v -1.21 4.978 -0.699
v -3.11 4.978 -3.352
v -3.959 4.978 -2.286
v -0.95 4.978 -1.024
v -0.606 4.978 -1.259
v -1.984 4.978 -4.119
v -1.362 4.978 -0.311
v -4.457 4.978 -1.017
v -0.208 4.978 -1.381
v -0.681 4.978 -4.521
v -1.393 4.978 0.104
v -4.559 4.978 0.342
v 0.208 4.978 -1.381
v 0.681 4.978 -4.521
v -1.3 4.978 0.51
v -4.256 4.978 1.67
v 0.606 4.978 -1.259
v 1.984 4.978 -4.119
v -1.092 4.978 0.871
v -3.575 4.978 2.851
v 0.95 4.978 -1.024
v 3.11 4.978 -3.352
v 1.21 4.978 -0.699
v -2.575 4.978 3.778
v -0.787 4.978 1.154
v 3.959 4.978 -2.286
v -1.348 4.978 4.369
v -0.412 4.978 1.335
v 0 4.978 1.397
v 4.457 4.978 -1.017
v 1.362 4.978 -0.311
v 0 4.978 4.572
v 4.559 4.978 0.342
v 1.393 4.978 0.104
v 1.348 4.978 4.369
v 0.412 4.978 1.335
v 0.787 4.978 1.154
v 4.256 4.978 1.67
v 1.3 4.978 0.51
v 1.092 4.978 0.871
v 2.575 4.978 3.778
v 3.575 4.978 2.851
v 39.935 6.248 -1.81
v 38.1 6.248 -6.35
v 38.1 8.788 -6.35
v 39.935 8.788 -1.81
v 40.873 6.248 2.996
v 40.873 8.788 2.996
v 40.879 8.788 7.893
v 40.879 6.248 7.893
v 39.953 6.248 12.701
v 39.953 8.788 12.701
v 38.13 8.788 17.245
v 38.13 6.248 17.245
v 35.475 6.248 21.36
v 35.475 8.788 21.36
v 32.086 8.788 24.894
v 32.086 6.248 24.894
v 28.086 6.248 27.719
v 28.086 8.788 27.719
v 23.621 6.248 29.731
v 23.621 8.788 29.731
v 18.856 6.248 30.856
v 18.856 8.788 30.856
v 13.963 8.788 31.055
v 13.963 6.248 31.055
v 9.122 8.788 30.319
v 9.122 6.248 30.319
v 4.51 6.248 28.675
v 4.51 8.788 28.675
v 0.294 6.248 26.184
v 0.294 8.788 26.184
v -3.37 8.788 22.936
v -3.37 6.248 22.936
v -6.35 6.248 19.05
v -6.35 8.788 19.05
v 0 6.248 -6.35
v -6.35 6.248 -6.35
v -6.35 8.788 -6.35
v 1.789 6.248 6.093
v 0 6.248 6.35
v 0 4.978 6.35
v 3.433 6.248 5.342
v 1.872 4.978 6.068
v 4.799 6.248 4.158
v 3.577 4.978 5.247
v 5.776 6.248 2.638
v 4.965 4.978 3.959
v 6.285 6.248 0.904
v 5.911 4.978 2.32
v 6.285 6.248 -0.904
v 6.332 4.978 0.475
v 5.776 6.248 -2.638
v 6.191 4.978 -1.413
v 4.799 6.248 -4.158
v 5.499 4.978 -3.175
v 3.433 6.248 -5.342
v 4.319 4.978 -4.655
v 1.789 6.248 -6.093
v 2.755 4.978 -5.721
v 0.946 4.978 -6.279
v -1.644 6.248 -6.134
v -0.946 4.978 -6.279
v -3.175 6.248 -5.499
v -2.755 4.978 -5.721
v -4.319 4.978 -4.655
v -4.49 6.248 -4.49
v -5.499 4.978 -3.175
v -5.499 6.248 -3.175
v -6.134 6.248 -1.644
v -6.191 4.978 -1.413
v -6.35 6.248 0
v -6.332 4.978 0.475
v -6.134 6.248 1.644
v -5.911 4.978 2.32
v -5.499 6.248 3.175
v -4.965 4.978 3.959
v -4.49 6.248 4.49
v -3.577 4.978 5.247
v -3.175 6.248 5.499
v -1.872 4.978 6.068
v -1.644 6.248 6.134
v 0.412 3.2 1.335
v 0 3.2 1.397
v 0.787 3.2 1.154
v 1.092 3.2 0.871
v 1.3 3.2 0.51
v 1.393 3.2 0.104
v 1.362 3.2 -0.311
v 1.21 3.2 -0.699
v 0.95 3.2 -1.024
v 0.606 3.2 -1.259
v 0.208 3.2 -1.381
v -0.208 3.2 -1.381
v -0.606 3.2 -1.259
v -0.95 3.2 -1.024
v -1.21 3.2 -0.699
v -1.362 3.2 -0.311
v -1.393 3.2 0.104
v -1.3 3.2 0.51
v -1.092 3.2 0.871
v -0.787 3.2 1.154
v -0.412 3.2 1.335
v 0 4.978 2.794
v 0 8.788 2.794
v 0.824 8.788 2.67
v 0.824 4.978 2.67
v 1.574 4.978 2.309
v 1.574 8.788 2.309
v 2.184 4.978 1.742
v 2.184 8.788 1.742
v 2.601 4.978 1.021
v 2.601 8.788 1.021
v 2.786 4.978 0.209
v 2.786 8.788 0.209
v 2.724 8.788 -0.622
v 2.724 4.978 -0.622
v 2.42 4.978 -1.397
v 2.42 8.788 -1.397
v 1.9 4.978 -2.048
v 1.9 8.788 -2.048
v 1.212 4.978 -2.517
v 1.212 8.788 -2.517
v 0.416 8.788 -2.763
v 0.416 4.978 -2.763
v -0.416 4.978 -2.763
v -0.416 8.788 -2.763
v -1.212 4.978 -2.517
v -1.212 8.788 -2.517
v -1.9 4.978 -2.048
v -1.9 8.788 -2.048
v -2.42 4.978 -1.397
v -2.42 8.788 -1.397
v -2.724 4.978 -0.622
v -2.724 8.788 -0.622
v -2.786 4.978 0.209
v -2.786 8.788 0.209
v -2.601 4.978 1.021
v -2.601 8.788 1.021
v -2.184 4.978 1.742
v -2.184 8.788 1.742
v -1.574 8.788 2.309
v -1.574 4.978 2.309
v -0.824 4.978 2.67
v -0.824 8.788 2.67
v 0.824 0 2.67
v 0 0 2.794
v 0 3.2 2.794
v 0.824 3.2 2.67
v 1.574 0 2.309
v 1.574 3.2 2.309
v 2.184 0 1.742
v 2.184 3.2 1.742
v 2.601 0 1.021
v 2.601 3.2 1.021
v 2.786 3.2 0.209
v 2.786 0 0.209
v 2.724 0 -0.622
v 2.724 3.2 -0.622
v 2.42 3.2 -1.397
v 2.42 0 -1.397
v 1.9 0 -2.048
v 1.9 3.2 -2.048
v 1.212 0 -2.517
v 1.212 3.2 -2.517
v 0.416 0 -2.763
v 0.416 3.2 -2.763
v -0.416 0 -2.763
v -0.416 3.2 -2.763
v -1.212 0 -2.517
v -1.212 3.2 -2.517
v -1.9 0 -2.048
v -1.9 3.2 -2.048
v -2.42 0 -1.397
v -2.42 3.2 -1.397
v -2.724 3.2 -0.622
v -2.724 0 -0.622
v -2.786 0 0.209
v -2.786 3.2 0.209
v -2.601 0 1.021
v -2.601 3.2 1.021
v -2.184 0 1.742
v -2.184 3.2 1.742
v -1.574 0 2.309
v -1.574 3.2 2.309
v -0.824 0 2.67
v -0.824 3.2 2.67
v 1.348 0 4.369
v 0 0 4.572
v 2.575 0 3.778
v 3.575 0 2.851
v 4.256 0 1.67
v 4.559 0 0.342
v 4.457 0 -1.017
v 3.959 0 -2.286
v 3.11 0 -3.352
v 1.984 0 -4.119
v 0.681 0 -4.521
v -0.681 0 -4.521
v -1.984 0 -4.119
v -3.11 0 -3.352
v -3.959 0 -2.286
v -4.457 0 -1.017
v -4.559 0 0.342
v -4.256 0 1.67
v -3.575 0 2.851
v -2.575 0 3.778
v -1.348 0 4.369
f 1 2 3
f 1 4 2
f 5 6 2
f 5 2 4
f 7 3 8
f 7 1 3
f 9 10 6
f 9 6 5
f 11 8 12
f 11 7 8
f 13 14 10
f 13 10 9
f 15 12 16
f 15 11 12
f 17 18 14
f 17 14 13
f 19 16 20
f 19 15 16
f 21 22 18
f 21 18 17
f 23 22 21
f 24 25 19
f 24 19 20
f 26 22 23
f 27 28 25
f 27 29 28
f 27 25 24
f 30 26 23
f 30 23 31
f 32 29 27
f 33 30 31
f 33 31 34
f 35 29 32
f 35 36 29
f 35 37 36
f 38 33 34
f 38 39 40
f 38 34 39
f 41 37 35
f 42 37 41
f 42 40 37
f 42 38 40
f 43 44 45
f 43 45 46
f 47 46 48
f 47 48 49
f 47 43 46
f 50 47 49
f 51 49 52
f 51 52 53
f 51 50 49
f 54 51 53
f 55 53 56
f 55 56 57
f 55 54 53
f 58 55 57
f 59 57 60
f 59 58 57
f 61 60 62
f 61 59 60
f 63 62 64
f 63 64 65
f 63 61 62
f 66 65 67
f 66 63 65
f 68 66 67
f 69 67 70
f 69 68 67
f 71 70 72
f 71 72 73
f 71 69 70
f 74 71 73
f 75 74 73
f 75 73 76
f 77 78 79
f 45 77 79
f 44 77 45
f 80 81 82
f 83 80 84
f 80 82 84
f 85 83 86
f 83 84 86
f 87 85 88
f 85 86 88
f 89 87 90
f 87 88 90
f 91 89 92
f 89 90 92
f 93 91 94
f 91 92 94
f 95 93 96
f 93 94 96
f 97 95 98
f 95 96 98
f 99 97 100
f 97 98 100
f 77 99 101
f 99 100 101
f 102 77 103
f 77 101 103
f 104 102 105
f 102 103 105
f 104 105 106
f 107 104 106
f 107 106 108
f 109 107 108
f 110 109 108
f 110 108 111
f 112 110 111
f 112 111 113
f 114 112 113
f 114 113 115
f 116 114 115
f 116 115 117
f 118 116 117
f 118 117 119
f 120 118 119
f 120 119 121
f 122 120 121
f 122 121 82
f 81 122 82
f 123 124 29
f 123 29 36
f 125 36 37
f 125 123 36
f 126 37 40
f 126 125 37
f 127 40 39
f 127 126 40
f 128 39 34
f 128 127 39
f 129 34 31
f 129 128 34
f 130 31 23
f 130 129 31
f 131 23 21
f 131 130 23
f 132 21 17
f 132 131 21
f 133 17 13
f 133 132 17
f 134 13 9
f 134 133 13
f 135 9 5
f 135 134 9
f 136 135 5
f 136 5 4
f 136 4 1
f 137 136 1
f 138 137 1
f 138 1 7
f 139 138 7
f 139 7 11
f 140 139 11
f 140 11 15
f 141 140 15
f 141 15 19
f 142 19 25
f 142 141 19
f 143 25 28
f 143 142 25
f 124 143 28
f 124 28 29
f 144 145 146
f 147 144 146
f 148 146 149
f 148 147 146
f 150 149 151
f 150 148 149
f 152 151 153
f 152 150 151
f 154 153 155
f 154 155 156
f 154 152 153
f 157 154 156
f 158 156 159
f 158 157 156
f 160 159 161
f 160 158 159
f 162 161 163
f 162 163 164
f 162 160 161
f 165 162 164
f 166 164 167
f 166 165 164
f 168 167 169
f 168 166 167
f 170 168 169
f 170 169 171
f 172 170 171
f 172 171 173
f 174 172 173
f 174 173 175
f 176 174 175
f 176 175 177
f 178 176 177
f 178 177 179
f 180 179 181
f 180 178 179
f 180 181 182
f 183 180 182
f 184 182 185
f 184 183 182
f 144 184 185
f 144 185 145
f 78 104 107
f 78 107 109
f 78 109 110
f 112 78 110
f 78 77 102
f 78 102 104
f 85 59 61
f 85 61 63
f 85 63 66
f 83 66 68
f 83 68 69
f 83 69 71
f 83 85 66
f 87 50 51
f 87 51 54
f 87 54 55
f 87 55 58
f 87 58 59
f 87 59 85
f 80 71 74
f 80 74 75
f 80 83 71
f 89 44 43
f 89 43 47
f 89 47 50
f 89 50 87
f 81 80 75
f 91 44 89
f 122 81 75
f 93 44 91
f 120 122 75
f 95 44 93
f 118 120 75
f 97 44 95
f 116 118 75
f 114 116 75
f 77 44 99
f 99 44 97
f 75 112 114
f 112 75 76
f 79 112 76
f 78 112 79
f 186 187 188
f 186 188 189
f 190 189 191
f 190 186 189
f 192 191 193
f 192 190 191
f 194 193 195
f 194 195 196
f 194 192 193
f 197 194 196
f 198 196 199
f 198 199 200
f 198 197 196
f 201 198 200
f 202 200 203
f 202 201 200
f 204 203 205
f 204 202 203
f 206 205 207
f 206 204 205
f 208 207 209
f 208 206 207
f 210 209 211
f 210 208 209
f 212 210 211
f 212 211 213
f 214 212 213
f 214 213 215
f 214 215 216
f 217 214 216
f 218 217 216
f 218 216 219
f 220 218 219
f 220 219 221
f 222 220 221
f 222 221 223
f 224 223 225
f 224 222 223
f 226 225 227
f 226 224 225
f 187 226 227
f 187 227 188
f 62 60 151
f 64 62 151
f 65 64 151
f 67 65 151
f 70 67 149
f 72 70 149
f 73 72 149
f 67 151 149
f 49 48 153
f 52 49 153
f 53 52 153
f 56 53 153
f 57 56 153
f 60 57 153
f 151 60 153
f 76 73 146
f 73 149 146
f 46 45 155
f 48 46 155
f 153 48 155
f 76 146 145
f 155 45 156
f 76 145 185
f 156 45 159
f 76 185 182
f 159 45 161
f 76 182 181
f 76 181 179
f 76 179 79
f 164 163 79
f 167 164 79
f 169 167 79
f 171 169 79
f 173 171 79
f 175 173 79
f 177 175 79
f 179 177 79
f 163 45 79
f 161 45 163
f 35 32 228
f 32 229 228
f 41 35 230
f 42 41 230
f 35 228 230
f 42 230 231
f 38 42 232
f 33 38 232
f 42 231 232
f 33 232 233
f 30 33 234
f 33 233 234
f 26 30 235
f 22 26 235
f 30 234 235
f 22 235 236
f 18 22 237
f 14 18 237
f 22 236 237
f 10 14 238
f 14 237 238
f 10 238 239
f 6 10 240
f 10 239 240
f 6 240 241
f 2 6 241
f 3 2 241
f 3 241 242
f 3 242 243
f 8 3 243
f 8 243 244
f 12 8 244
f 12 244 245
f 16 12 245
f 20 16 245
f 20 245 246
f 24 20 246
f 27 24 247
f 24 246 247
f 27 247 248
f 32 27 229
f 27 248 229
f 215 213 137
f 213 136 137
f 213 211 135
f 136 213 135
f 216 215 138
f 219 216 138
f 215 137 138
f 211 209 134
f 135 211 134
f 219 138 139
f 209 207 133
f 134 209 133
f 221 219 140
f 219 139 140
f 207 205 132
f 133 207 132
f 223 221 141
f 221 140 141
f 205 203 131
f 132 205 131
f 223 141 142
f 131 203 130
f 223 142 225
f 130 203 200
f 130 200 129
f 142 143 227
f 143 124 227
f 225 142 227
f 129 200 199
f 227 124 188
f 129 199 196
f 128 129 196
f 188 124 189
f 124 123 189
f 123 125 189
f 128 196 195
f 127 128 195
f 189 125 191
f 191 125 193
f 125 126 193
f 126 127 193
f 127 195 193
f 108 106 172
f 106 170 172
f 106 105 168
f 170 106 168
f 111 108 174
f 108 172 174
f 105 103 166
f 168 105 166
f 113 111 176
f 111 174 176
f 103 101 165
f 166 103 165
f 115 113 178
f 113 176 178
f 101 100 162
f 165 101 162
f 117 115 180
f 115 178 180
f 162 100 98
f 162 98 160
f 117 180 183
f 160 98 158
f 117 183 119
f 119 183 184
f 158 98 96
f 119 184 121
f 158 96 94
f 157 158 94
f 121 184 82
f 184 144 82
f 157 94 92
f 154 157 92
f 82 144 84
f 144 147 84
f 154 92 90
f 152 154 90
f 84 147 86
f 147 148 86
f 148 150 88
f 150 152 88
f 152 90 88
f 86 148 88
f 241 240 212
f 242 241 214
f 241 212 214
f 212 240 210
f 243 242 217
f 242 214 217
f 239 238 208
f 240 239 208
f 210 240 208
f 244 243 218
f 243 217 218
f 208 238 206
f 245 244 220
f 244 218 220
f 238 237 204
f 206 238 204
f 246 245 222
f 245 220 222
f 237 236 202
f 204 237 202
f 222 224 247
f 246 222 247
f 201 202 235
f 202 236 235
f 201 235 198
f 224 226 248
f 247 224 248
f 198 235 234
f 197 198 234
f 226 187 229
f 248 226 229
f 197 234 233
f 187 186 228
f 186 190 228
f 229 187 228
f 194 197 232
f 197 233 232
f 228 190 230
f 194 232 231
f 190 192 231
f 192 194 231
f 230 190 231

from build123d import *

# Parameters (mm, degrees)
SKETCH1_R           = 4.572
SKETCH1_R_2         = 2.794
BOSS_EXTRUDE1_DEPTH = 3.2004
SKETCH2_R           = 4.572
SKETCH2_R_2         = 1.397
BOSS_EXTRUDE2_DEPTH = 1.778
SKETCH3_R           = 6.35
SKETCH3_R_2         = 2.794
BOSS_EXTRUDE3_DEPTH = 1.27
SKETCH4_R           = 2.794
BOSS_EXTRUDE4_DEPTH = 2.54


with BuildPart() as part:
    # Sketch1 → Boss-Extrude1 (new body)
    with BuildSketch(Plane(origin=(0, 0, 0), x_dir=(1, 0, 0), z_dir=(0, 1, 0))):
        with Locations(Location((0, 0, 0), (0, 0, 270))):
            Circle(SKETCH1_R)
        with Locations(Location((0, 0, 0), (0, 0, 270))):
            Circle(SKETCH1_R_2, mode=Mode.SUBTRACT)
    extrude(amount=BOSS_EXTRUDE1_DEPTH)

    # Sketch2 → Boss-Extrude2 (add)
    with BuildSketch(Plane(origin=(0, 3.2004, 0), x_dir=(1, 0, 0), z_dir=(0, 1, 0))):
        with Locations(Location((0, 0, 0), (0, 0, 270))):
            Circle(SKETCH2_R)
        with Locations(Location((0, 0, 0), (0, 0, 270))):
            Circle(SKETCH2_R_2, mode=Mode.SUBTRACT)
    extrude(amount=BOSS_EXTRUDE2_DEPTH)


with BuildPart() as body_2:
    # Sketch3 → Boss-Extrude3 (new body)
    with BuildSketch(Plane(origin=(0, 4.9784, 0), x_dir=(1, 0, 0), z_dir=(0, 1, 0))):
        with Locations(Location((0, 0, 0), (0, 0, 270))):
            Circle(SKETCH3_R)
        with Locations(Location((0, 0, 0), (0, 0, 270))):
            Circle(SKETCH3_R_2, mode=Mode.SUBTRACT)
    extrude(amount=BOSS_EXTRUDE3_DEPTH)

    # Sketch4 → Boss-Extrude4 (add)
    with BuildSketch(Plane(origin=(0, 6.2484, 0), x_dir=(1, 0, 0), z_dir=(0, 1, 0))):
        with BuildLine():
            Line((-6.35, 6.35), (38.1, 6.35))
            ThreePointArc((38.1, 6.35), (28.085656371, -27.718648649), (-6.35, -19.05))
            Line((-6.35, -19.05), (-6.35, 6.35))
        make_face()
        with Locations(Location((0, 0, 0), (0, 0, 270))):
            Circle(SKETCH4_R, mode=Mode.SUBTRACT)
    extrude(amount=BOSS_EXTRUDE4_DEPTH)


solid = Compound([part.part, body_2.part])
